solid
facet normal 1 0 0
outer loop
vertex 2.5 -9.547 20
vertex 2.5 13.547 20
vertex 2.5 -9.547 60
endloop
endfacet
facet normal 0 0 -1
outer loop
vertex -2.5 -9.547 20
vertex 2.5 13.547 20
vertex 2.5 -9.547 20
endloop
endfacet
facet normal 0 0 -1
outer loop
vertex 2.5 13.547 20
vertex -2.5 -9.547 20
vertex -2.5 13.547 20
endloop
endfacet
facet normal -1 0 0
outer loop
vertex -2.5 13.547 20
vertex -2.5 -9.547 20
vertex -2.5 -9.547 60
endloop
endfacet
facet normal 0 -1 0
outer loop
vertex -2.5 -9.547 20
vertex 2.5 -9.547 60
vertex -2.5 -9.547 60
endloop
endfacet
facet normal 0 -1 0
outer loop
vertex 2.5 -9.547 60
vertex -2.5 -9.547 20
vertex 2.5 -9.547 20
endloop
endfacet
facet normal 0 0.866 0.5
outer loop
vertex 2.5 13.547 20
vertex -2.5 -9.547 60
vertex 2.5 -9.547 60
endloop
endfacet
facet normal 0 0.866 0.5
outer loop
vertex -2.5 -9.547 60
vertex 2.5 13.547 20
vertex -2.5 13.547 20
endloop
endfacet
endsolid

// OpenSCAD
ang = 30;

module fins(fin_h, triangle=false){
    
    if(triangle){
        difference() {
            cube([3, ((fin_h*sin(ang))/cos(ang))*2, fin_h], center=true);
            rotate([ang, 0, 0]) translate([0, -fin_h-5, 0])cube([20, fin_h*2, fin_h*2], center=true);
            rotate([-ang, 0, 0]) translate([0, fin_h+5, 0])cube([20, fin_h*2, fin_h*2], center=true);
        }
    }else{
        translate([0,2,fin_h])
        intersection() {
            cube([5, (fin_h*sin(ang))/cos(ang), fin_h], center=true);
            rotate([ang, 0, 0]) translate([0, -fin_h, 0])cube([20, fin_h*2, fin_h*2], center=true);
        }
    }
}


fins(40);
